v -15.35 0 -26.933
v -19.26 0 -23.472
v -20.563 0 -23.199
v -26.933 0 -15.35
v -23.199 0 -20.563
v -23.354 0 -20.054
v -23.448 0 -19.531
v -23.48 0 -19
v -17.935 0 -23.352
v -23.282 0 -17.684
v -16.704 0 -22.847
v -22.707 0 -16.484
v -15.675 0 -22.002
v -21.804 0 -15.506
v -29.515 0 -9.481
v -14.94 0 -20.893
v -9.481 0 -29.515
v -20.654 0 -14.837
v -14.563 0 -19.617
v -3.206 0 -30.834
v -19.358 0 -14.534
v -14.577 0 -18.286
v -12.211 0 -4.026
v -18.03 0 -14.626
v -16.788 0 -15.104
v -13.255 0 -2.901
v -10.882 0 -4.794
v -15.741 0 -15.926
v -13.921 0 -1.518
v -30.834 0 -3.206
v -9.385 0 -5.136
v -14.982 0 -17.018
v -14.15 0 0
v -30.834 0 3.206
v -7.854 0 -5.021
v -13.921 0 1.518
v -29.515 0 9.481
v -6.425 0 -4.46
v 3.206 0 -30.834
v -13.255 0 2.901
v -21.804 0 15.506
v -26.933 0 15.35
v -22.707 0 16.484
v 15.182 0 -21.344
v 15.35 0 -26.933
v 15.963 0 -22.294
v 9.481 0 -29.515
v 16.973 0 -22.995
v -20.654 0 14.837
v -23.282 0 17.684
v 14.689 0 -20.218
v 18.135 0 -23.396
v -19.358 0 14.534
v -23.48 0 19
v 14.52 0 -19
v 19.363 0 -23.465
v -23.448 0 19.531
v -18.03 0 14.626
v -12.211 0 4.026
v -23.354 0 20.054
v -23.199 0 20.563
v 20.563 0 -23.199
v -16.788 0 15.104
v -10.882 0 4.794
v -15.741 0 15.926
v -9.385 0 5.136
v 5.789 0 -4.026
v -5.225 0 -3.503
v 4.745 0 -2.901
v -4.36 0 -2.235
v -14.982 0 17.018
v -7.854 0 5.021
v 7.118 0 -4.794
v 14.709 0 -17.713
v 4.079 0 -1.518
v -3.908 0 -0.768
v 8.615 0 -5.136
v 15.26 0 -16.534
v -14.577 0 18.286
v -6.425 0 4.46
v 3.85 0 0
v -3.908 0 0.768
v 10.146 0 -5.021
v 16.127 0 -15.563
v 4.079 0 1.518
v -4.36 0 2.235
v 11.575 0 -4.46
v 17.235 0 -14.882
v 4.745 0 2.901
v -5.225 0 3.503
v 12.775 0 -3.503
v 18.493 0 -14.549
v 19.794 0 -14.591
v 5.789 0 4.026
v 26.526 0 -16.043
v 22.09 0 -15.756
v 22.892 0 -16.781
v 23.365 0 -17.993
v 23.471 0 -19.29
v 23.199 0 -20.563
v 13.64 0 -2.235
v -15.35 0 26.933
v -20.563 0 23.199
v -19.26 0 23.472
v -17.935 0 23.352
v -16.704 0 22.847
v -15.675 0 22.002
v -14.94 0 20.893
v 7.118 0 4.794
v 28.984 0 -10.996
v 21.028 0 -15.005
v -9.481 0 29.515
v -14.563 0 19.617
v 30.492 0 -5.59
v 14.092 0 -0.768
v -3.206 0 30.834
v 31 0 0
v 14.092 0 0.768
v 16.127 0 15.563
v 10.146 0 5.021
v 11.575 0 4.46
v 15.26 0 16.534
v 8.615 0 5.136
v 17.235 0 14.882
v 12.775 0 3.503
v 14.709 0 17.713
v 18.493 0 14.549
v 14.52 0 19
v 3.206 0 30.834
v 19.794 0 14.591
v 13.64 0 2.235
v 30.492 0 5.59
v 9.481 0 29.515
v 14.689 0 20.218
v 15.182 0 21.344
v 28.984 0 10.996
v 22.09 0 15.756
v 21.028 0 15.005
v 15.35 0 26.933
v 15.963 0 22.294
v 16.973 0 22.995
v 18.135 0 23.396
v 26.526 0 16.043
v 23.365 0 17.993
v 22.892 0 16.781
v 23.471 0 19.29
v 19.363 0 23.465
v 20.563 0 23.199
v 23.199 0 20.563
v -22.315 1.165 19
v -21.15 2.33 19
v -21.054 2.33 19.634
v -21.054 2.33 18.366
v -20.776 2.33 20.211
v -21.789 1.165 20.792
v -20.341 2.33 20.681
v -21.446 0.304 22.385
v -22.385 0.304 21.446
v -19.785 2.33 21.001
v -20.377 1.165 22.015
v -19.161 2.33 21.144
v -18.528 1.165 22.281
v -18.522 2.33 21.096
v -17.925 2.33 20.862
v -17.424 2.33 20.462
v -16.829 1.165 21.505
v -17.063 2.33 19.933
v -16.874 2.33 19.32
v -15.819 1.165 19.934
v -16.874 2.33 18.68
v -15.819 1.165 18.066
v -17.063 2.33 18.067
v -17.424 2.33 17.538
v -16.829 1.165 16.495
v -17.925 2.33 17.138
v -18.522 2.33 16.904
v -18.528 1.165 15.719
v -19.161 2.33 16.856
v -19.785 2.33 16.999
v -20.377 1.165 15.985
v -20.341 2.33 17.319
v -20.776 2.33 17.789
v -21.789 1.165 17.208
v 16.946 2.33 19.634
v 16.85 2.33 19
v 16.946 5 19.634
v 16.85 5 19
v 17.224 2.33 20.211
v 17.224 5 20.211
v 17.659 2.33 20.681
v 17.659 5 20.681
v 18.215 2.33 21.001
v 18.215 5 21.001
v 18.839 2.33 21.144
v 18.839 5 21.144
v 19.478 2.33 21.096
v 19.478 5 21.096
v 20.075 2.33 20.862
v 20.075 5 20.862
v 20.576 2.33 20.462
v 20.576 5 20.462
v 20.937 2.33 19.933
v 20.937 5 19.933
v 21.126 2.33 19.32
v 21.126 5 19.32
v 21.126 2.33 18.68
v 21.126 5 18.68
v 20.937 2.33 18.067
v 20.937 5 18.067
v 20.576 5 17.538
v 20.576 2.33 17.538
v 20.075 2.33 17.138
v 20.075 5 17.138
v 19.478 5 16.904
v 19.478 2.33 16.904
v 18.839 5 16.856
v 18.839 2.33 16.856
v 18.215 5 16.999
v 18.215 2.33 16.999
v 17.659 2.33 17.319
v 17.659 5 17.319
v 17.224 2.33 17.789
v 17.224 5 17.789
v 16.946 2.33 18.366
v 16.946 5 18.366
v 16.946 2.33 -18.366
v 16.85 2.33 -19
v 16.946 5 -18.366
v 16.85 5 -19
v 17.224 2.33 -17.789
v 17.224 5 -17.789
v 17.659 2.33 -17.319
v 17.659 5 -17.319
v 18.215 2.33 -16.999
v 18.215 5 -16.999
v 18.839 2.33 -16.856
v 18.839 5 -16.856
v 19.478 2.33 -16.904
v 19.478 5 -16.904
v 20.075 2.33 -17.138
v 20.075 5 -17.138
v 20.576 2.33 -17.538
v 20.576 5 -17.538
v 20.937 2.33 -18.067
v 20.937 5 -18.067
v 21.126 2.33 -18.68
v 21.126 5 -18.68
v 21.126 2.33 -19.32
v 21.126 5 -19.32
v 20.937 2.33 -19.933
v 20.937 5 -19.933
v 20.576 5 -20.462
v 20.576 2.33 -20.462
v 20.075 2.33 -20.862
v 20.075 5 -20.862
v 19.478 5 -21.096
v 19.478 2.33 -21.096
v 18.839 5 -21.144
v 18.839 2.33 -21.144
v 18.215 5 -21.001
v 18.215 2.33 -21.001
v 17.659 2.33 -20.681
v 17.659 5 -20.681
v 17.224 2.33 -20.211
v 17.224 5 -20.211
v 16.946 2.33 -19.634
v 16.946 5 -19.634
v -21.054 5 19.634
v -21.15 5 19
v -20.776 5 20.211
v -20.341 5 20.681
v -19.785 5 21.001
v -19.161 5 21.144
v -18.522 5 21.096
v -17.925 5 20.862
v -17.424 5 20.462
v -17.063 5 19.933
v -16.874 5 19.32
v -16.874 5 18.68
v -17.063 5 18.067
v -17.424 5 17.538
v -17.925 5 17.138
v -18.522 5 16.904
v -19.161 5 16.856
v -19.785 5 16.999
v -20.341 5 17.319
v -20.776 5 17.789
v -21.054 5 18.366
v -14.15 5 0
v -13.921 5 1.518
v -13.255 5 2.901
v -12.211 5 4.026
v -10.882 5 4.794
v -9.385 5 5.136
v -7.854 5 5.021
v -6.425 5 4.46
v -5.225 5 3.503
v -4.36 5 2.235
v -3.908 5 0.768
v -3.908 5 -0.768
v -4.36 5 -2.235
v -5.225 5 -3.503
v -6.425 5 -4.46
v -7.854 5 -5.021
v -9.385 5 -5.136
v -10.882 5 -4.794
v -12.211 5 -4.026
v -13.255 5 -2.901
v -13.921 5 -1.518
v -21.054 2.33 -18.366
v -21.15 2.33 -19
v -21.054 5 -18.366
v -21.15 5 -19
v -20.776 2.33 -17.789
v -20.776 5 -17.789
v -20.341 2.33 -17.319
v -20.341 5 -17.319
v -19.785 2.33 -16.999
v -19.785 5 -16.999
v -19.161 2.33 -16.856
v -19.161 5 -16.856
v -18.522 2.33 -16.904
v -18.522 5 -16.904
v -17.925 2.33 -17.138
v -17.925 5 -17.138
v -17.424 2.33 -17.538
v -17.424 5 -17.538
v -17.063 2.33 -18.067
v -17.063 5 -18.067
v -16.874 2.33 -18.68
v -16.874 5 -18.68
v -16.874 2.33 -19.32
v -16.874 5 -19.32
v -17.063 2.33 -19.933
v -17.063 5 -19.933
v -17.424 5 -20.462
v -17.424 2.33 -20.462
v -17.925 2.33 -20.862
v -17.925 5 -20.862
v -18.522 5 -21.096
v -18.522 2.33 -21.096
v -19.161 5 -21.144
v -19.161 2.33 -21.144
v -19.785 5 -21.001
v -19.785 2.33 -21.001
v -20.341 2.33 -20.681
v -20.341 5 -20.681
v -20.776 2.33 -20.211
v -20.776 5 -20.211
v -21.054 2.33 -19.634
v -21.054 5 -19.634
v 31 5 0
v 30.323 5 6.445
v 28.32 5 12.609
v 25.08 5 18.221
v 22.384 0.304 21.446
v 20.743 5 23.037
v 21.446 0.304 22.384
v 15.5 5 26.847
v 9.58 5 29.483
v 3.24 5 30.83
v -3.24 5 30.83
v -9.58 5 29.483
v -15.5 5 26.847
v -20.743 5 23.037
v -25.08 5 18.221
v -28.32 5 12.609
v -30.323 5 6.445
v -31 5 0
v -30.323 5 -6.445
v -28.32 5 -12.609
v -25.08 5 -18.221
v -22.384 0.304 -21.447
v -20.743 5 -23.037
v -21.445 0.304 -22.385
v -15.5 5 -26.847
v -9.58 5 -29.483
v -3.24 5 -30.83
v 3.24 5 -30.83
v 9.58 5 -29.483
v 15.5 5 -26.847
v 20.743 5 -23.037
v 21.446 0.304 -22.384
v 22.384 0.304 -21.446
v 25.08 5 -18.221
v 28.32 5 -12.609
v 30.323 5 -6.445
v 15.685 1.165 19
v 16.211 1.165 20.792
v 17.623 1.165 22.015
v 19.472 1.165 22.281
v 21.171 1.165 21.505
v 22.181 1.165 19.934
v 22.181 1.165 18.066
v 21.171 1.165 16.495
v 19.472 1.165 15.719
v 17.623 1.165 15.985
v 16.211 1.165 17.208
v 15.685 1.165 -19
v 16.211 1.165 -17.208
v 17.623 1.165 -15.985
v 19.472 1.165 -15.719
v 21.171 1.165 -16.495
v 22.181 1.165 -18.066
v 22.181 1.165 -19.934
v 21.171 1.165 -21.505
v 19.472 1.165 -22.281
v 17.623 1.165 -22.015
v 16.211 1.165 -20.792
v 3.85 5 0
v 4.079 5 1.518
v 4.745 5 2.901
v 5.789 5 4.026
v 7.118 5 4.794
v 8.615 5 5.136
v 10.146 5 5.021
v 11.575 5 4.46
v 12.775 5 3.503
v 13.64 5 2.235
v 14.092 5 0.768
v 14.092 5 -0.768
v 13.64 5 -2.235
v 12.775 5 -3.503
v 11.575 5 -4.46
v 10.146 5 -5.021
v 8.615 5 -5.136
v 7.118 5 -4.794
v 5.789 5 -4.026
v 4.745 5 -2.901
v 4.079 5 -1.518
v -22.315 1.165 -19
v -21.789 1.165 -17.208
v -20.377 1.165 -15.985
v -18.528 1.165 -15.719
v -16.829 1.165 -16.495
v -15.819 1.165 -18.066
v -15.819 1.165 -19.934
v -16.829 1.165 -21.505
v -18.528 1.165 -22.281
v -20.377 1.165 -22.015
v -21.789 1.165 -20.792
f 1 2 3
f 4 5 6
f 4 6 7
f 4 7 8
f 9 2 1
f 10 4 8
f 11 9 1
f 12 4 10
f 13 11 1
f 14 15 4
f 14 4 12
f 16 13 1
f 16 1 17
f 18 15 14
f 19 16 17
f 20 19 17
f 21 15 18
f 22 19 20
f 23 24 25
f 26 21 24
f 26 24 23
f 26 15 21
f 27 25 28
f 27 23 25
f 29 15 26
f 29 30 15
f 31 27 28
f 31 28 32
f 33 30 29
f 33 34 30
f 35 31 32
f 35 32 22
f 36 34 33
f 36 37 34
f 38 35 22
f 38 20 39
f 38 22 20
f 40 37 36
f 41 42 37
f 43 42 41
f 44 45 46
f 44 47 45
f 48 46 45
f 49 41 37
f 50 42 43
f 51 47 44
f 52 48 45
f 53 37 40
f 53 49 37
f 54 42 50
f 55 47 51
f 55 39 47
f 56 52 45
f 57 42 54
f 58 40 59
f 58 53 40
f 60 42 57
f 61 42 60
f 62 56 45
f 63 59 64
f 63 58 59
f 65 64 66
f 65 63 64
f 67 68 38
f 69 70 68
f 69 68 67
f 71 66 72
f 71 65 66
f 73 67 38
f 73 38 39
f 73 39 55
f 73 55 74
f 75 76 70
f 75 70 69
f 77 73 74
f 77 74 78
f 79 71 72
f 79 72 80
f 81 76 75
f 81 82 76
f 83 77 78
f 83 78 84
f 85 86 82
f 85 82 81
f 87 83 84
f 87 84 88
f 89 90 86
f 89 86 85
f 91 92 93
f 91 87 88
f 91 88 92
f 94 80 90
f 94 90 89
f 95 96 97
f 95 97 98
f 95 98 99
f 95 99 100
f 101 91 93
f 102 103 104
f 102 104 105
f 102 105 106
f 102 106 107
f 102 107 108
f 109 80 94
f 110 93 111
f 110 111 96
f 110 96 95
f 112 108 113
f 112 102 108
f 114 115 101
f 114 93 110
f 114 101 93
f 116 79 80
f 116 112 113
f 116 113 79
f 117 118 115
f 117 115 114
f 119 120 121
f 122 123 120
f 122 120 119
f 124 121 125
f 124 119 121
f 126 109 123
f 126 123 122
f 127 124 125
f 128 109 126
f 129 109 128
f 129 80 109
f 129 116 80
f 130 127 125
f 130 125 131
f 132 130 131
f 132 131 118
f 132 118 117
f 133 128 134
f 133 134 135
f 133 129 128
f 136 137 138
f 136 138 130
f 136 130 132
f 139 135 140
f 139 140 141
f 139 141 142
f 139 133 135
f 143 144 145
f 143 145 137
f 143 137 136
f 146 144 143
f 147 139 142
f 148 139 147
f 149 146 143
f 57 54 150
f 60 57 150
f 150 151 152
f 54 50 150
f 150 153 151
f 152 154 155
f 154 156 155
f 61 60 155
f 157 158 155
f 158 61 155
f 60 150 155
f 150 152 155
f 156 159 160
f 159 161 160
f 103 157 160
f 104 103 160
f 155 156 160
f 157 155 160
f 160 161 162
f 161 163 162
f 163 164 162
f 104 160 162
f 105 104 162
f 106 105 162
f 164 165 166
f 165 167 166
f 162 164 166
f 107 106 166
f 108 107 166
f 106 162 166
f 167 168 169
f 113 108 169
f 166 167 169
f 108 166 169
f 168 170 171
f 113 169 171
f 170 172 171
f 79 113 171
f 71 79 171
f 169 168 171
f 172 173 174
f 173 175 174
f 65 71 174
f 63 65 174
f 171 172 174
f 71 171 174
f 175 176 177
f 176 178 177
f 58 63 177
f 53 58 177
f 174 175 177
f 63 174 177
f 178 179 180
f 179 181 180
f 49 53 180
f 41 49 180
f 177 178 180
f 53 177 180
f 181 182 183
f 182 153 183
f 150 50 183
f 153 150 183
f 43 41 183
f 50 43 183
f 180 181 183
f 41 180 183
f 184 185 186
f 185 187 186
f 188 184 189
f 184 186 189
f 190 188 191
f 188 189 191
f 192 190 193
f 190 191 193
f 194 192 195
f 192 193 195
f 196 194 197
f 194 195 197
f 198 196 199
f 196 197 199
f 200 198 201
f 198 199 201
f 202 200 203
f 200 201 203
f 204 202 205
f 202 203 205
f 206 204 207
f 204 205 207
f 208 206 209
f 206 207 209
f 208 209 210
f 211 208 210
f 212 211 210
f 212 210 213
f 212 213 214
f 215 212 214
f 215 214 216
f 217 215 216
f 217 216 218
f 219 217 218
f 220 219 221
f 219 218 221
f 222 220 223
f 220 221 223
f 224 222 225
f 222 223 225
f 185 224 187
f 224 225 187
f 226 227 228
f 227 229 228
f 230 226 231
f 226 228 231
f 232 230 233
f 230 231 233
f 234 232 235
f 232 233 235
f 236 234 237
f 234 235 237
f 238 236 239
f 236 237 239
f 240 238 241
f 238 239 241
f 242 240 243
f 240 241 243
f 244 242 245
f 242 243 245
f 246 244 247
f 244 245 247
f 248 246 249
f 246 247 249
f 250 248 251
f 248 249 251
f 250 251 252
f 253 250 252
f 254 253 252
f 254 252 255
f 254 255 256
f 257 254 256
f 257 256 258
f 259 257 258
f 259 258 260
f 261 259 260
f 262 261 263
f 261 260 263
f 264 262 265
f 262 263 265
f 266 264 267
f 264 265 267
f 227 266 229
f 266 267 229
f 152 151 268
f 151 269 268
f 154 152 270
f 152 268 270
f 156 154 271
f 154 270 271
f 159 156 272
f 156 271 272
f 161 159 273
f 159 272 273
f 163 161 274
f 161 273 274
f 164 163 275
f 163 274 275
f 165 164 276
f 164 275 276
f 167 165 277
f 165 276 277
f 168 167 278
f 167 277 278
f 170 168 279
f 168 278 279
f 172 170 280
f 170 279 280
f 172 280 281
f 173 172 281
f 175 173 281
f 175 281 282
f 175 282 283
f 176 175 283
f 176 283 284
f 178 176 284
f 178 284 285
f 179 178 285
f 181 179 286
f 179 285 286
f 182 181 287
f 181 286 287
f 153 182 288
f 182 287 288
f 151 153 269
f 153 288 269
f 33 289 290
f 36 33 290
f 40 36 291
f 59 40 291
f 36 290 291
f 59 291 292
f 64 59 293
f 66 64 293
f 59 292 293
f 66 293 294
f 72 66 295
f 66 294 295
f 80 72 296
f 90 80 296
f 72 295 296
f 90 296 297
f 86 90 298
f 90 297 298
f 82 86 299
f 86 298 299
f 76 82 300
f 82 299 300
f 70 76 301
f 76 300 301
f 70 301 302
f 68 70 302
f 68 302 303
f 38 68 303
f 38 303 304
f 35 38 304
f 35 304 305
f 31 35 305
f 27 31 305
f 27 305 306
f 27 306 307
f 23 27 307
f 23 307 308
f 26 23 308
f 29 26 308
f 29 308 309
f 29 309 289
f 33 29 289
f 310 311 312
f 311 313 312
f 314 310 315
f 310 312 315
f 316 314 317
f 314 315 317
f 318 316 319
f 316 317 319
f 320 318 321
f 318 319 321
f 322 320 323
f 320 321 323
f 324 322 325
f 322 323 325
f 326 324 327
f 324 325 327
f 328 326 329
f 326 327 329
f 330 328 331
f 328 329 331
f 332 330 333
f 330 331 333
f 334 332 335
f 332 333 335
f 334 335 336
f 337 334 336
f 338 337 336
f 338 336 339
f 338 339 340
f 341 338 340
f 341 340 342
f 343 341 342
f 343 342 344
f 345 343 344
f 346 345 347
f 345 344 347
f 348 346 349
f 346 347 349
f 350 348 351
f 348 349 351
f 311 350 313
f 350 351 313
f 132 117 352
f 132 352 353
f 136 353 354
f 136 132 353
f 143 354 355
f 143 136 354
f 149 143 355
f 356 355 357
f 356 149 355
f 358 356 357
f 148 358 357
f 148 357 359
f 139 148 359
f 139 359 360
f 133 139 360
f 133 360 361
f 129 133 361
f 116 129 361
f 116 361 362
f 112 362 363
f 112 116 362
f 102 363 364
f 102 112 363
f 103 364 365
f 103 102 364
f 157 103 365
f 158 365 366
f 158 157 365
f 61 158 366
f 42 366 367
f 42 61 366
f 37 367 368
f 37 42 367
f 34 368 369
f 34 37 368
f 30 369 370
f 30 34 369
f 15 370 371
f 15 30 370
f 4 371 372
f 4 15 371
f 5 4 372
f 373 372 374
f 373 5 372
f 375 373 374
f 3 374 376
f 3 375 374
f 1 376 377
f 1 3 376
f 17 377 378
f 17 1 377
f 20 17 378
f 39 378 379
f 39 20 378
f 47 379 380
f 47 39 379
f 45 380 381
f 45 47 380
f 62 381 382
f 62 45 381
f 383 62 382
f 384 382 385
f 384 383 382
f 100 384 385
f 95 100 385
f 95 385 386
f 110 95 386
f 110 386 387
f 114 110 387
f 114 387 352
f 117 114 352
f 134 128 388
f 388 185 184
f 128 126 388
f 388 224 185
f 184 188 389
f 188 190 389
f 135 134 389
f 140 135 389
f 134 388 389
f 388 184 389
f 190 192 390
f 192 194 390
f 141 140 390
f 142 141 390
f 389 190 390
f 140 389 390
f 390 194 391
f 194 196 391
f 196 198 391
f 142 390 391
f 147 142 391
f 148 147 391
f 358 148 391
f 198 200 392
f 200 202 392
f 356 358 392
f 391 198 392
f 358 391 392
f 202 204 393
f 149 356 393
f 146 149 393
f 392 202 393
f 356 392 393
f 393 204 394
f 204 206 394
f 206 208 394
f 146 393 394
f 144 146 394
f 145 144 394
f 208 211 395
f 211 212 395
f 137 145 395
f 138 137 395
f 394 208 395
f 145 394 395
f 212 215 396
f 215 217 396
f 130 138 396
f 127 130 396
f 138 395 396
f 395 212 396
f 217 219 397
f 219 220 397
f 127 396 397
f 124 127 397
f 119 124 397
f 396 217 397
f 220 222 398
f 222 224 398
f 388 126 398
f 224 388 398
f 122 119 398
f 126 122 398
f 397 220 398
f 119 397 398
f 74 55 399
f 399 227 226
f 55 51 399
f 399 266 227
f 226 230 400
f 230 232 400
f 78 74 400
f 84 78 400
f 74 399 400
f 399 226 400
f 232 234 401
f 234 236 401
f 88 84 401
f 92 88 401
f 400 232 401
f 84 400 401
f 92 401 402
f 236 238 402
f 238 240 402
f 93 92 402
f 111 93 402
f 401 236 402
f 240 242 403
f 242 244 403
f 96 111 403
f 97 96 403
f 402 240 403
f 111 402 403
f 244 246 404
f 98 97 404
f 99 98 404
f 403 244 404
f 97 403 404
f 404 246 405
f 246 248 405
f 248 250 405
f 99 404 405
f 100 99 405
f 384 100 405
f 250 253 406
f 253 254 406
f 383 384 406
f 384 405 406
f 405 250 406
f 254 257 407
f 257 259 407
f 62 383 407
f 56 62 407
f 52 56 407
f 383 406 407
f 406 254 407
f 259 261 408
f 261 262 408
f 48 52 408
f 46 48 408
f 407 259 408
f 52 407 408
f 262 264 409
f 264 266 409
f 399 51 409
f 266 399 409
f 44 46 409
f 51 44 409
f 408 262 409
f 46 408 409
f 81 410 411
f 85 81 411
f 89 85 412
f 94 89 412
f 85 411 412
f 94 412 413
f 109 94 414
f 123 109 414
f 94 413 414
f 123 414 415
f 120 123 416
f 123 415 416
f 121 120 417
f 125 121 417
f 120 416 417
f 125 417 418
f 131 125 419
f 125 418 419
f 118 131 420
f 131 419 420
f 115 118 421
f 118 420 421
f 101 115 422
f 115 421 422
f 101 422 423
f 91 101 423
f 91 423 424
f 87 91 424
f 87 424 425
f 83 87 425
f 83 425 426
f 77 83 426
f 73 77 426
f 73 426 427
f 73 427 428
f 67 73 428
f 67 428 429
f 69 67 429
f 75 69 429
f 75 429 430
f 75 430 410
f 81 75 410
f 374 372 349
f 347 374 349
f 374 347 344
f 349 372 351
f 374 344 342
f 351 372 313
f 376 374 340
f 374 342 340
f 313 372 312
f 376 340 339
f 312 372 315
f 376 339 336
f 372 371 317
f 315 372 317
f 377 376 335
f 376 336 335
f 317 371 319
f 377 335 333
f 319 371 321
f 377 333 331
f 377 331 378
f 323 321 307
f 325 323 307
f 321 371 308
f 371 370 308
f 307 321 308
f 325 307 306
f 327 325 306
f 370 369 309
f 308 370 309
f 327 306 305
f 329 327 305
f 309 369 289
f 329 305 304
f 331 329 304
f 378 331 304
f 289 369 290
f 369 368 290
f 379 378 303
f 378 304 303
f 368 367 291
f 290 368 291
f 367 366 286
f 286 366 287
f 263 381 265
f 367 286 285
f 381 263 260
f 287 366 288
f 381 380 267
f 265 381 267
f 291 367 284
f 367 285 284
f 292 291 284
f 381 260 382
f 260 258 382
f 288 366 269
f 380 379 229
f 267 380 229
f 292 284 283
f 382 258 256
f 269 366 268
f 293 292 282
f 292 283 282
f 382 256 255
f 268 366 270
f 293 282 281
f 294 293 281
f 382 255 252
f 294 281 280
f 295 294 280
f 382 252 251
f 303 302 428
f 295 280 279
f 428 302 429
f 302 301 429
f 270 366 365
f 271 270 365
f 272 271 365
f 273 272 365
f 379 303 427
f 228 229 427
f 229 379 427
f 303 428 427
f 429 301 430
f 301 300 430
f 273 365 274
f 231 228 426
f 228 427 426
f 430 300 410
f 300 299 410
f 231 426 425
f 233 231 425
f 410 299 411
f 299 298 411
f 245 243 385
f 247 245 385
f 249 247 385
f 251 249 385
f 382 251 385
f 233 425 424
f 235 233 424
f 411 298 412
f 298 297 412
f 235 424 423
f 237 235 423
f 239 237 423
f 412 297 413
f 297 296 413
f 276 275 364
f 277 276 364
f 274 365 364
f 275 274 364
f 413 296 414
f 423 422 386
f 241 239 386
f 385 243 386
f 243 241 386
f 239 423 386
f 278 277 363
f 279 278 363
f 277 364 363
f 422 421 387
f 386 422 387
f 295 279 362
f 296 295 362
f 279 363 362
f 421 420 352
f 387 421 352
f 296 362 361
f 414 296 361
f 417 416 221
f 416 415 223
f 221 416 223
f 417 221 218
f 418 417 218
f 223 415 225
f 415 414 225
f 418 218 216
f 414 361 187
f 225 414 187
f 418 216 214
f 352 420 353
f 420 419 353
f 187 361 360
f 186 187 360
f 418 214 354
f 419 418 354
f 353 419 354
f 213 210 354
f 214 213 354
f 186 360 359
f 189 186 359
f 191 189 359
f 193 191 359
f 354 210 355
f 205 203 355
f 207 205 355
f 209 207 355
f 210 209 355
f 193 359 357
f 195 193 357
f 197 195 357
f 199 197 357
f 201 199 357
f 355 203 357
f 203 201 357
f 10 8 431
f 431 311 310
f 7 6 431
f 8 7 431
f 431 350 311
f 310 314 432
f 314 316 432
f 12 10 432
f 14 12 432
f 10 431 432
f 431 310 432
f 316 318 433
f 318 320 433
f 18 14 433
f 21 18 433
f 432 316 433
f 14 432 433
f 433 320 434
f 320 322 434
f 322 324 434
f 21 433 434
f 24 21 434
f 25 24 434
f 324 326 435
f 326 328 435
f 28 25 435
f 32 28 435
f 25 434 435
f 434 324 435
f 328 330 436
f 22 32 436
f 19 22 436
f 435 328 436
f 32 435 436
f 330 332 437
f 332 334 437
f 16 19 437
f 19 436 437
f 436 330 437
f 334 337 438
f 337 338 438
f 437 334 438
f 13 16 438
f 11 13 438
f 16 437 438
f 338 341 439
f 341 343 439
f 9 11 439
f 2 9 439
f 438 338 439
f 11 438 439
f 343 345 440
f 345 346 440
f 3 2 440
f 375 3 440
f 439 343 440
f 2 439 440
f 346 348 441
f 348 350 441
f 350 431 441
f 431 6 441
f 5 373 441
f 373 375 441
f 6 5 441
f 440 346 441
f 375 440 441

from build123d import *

# Parameters (mm, degrees)
F0_R           = 31
F1_DEPTH       = 5
F2_D           = 10.3
F3_D           = 4.3
F3_CSINK_D     = 8.96
F3_CSINK_ANGLE = 90


with BuildPart() as f1:
    # F0 (on Front) → F1 (new body)
    with BuildSketch(Plane.XZ):
        Circle(F0_R)
    extrude(amount=-F1_DEPTH)

    # F2 (through all)
    with Locations(Plane.XZ):
        with Locations((-9, 0), (9, 0)):
            Hole(F2_D / 2)

    # F3 (through all)
    with Locations(Plane.XZ):
        with Locations((-19, 19), (19, 19), (19, -19), (-19, -19)):
            CounterSinkHole(F3_D / 2, F3_CSINK_D / 2, counter_sink_angle=F3_CSINK_ANGLE)


solid = f1.part
